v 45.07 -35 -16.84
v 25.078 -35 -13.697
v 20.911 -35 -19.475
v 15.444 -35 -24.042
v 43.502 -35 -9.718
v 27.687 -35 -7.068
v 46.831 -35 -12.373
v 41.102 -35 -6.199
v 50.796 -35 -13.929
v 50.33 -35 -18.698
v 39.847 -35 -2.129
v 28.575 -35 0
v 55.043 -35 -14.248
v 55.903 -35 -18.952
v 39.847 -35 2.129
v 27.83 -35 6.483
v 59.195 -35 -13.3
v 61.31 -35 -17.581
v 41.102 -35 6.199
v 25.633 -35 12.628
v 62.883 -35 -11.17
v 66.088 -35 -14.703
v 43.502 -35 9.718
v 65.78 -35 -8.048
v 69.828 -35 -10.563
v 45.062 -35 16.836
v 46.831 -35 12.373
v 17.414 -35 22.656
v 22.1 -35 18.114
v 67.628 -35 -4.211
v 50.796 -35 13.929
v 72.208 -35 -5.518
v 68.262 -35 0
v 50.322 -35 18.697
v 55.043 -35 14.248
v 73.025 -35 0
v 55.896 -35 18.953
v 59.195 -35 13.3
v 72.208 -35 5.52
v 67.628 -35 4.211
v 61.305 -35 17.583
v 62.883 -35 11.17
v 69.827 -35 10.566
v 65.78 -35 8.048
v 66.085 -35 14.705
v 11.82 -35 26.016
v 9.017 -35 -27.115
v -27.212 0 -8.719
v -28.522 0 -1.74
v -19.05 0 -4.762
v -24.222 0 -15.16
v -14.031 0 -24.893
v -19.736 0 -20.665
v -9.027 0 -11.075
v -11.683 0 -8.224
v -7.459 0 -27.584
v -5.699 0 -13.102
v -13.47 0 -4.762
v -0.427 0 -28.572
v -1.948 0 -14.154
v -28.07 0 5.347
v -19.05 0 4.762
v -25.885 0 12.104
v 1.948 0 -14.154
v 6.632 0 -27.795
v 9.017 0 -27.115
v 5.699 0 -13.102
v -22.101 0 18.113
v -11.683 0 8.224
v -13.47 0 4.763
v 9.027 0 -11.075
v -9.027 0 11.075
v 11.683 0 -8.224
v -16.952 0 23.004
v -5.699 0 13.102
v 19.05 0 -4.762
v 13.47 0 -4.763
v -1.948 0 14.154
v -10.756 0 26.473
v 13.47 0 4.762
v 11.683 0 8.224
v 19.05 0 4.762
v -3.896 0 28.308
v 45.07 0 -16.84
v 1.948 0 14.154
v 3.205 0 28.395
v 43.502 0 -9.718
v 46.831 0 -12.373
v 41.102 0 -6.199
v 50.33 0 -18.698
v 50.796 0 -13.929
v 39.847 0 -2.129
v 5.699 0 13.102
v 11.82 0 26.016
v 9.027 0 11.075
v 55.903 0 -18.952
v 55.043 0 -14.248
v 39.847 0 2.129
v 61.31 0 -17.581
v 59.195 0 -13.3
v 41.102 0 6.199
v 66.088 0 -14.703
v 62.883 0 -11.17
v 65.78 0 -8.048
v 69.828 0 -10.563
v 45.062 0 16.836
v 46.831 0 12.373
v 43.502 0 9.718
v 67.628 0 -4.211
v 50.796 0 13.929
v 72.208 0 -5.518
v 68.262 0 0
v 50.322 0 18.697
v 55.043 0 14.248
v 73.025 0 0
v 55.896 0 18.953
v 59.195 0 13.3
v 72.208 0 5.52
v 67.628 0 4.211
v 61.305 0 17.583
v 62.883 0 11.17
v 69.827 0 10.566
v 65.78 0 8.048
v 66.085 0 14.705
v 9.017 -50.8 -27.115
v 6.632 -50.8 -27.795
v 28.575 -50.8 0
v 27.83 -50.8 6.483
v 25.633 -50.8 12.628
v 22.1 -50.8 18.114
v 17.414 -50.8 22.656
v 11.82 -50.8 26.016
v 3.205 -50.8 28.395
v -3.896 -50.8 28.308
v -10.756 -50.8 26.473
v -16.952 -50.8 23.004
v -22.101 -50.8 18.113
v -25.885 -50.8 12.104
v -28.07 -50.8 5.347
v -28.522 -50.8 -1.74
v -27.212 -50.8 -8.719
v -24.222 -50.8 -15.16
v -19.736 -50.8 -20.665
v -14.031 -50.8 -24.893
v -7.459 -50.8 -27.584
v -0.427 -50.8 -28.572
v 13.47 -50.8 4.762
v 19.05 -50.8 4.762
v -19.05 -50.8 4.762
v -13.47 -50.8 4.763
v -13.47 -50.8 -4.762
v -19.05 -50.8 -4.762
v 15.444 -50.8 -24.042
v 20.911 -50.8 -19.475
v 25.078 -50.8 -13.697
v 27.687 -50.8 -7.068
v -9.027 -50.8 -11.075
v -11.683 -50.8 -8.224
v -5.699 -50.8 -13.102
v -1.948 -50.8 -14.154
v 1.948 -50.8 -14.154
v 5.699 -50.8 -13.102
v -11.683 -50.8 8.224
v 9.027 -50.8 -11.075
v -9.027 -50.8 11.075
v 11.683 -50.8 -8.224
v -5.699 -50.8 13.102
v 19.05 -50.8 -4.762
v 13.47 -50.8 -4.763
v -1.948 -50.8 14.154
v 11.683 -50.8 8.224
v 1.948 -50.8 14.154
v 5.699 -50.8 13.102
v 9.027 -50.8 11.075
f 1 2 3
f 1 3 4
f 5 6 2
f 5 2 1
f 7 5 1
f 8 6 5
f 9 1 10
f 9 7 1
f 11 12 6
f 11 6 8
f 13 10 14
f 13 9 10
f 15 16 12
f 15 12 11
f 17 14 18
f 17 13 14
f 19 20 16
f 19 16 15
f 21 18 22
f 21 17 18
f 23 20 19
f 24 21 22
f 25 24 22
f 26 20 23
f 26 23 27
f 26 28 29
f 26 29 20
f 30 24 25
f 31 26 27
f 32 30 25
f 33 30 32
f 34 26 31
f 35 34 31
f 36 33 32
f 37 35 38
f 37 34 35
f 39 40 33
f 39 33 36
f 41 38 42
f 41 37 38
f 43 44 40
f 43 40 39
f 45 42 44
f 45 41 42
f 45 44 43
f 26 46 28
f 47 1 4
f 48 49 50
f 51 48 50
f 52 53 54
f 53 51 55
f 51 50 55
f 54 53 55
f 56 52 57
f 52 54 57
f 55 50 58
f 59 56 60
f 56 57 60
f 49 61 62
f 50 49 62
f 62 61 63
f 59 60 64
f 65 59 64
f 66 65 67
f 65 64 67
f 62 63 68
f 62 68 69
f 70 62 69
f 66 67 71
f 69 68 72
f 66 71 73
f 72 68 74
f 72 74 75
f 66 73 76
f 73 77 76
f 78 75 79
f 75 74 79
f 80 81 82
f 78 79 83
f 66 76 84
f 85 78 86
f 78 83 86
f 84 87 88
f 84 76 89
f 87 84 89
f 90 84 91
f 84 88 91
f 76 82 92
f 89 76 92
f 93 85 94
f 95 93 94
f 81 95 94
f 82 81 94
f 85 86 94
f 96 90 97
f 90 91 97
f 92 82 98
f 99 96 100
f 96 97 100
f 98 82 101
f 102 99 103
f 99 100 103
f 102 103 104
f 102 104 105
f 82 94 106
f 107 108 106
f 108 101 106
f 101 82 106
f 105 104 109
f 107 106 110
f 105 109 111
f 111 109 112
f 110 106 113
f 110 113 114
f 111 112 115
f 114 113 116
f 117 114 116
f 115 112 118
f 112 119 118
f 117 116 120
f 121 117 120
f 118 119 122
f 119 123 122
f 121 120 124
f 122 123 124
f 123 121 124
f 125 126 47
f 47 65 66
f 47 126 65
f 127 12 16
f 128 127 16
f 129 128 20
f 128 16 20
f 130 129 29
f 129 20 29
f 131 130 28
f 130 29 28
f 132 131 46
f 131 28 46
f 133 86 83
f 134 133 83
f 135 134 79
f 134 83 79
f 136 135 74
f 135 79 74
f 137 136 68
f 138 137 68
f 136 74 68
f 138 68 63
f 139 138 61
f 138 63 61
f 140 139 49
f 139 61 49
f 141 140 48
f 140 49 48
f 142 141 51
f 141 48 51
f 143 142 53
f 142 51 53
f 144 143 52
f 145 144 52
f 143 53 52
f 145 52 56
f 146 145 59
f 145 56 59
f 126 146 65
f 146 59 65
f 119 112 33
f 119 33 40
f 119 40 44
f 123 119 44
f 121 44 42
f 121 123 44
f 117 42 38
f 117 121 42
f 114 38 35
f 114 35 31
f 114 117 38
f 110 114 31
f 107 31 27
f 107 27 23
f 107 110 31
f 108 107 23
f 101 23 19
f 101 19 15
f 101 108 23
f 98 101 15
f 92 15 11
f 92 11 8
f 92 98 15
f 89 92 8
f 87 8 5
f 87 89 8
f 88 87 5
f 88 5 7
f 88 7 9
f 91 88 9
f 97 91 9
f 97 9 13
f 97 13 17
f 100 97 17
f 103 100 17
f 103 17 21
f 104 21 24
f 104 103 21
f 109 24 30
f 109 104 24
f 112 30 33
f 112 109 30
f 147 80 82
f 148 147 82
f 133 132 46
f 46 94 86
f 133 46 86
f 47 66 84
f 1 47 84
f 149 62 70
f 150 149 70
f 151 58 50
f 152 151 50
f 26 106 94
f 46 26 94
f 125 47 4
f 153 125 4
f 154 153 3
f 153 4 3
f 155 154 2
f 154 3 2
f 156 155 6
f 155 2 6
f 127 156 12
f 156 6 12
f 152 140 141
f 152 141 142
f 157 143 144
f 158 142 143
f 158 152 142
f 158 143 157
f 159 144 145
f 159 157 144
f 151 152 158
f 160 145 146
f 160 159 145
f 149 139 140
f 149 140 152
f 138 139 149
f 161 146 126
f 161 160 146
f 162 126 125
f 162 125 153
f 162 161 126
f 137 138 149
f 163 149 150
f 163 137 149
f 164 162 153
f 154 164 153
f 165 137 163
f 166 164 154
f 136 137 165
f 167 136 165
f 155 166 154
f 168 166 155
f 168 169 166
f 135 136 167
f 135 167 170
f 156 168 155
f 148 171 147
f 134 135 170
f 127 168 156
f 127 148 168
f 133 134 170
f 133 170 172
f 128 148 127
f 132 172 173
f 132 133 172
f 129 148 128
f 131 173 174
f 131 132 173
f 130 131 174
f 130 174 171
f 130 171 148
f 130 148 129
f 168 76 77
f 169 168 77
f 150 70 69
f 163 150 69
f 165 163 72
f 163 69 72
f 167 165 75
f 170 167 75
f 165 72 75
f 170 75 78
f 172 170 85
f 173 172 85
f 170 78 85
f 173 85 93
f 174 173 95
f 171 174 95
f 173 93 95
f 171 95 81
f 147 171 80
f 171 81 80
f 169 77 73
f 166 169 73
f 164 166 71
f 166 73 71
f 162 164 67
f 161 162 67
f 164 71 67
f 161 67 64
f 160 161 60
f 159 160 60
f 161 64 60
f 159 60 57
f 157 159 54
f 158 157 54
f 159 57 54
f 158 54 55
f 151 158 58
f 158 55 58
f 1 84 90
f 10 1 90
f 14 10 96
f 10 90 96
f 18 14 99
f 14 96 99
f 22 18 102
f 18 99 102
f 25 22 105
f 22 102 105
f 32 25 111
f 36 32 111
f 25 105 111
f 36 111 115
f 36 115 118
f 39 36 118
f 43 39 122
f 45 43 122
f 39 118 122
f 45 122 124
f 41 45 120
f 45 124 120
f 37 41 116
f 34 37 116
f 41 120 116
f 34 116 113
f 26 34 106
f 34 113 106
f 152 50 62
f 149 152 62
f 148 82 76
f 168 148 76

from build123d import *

# Parameters (mm, degrees)
F0_R     = 14.2875
F1_DEPTH = 35
F2_DEPTH = 50.8


with BuildPart() as f1:
    # F0 (on Front) → F1 (new body)
    with BuildSketch(Plane.XZ):
        with BuildLine():
            Line((11.8201890877, 26.0156444266), (3.2047751505, 28.3947185447))
            ThreePointArc((3.2047751505, 28.3947185447), (-28.5220001461, -1.739578301), (6.631814894, -27.7947774989))
            Line((6.631814894, -27.7947774989), (9.0167764908, -27.1150948129))
            ThreePointArc((9.0167764908, -27.1150948129), (23.1752563441, -16.7164026748), (28.575, 0))
            ThreePointArc((28.575, 0), (24.0238686329, 15.47205096), (11.8201890877, 26.0156444266))
        make_face()
        with BuildLine():
            ThreePointArc((-13.4703841816, 4.7625), (0, 14.2875), (13.4703841816, 4.7625))
            Line((13.4703841816, 4.7625), (19.05, 4.7625))
            Line((19.05, 4.7625), (19.05, -4.7625))
            Line((19.05, -4.7625), (13.4703841816, -4.7625))
            ThreePointArc((13.4703841816, -4.7625), (0, -14.2875), (-13.4703841816, -4.7625))
            Line((-13.4703841816, -4.7625), (-19.05, -4.7625))
            Line((-19.05, -4.7625), (-19.05, 4.7625))
            Line((-19.05, 4.7625), (-13.4703841816, 4.7625))
        make_face(mode=Mode.SUBTRACT)
        with BuildLine():
            Line((45.0618756476, 16.8362321877), (11.8201890877, 26.0156444266))
            ThreePointArc((11.8201890877, 26.0156444266), (24.0238686329, 15.47205096), (28.575, 0))
            ThreePointArc((28.575, 0), (23.1752563441, -16.7164026748), (9.0167764908, -27.1150948129))
            Line((9.0167764908, -27.1150948129), (45.0698397536, -16.8404459854))
            ThreePointArc((45.0698397536, -16.8404459854), (34.9250005327, -0.0045050825), (45.0618756476, 16.8362321877))
        make_face()
        with BuildLine():
            ThreePointArc((73.025, 0), (63.8011762931, 16.3201948351), (45.0618756476, 16.8362321877))
            ThreePointArc((45.0618756476, 16.8362321877), (34.9250005327, -0.0045050825), (45.0698397536, -16.8404459854))
            ThreePointArc((45.0698397536, -16.8404459854), (63.8050355367, -16.3178706131), (73.025, 0))
        make_face()
        with Locations((53.975, 0)):
            Circle(F0_R, mode=Mode.SUBTRACT)
    extrude(amount=F1_DEPTH)

    # F0 (on Front) → F2 (join)
    with BuildSketch(Plane.XZ):
        with BuildLine():
            Line((11.8201890877, 26.0156444266), (3.2047751505, 28.3947185447))
            ThreePointArc((3.2047751505, 28.3947185447), (-28.5220001461, -1.739578301), (6.631814894, -27.7947774989))
            Line((6.631814894, -27.7947774989), (9.0167764908, -27.1150948129))
            ThreePointArc((9.0167764908, -27.1150948129), (23.1752563441, -16.7164026748), (28.575, 0))
            ThreePointArc((28.575, 0), (24.0238686329, 15.47205096), (11.8201890877, 26.0156444266))
        make_face()
        with BuildLine():
            ThreePointArc((-13.4703841816, 4.7625), (0, 14.2875), (13.4703841816, 4.7625))
            Line((13.4703841816, 4.7625), (19.05, 4.7625))
            Line((19.05, 4.7625), (19.05, -4.7625))
            Line((19.05, -4.7625), (13.4703841816, -4.7625))
            ThreePointArc((13.4703841816, -4.7625), (0, -14.2875), (-13.4703841816, -4.7625))
            Line((-13.4703841816, -4.7625), (-19.05, -4.7625))
            Line((-19.05, -4.7625), (-19.05, 4.7625))
            Line((-19.05, 4.7625), (-13.4703841816, 4.7625))
        make_face(mode=Mode.SUBTRACT)
    extrude(amount=F2_DEPTH)


solid = f1.part
